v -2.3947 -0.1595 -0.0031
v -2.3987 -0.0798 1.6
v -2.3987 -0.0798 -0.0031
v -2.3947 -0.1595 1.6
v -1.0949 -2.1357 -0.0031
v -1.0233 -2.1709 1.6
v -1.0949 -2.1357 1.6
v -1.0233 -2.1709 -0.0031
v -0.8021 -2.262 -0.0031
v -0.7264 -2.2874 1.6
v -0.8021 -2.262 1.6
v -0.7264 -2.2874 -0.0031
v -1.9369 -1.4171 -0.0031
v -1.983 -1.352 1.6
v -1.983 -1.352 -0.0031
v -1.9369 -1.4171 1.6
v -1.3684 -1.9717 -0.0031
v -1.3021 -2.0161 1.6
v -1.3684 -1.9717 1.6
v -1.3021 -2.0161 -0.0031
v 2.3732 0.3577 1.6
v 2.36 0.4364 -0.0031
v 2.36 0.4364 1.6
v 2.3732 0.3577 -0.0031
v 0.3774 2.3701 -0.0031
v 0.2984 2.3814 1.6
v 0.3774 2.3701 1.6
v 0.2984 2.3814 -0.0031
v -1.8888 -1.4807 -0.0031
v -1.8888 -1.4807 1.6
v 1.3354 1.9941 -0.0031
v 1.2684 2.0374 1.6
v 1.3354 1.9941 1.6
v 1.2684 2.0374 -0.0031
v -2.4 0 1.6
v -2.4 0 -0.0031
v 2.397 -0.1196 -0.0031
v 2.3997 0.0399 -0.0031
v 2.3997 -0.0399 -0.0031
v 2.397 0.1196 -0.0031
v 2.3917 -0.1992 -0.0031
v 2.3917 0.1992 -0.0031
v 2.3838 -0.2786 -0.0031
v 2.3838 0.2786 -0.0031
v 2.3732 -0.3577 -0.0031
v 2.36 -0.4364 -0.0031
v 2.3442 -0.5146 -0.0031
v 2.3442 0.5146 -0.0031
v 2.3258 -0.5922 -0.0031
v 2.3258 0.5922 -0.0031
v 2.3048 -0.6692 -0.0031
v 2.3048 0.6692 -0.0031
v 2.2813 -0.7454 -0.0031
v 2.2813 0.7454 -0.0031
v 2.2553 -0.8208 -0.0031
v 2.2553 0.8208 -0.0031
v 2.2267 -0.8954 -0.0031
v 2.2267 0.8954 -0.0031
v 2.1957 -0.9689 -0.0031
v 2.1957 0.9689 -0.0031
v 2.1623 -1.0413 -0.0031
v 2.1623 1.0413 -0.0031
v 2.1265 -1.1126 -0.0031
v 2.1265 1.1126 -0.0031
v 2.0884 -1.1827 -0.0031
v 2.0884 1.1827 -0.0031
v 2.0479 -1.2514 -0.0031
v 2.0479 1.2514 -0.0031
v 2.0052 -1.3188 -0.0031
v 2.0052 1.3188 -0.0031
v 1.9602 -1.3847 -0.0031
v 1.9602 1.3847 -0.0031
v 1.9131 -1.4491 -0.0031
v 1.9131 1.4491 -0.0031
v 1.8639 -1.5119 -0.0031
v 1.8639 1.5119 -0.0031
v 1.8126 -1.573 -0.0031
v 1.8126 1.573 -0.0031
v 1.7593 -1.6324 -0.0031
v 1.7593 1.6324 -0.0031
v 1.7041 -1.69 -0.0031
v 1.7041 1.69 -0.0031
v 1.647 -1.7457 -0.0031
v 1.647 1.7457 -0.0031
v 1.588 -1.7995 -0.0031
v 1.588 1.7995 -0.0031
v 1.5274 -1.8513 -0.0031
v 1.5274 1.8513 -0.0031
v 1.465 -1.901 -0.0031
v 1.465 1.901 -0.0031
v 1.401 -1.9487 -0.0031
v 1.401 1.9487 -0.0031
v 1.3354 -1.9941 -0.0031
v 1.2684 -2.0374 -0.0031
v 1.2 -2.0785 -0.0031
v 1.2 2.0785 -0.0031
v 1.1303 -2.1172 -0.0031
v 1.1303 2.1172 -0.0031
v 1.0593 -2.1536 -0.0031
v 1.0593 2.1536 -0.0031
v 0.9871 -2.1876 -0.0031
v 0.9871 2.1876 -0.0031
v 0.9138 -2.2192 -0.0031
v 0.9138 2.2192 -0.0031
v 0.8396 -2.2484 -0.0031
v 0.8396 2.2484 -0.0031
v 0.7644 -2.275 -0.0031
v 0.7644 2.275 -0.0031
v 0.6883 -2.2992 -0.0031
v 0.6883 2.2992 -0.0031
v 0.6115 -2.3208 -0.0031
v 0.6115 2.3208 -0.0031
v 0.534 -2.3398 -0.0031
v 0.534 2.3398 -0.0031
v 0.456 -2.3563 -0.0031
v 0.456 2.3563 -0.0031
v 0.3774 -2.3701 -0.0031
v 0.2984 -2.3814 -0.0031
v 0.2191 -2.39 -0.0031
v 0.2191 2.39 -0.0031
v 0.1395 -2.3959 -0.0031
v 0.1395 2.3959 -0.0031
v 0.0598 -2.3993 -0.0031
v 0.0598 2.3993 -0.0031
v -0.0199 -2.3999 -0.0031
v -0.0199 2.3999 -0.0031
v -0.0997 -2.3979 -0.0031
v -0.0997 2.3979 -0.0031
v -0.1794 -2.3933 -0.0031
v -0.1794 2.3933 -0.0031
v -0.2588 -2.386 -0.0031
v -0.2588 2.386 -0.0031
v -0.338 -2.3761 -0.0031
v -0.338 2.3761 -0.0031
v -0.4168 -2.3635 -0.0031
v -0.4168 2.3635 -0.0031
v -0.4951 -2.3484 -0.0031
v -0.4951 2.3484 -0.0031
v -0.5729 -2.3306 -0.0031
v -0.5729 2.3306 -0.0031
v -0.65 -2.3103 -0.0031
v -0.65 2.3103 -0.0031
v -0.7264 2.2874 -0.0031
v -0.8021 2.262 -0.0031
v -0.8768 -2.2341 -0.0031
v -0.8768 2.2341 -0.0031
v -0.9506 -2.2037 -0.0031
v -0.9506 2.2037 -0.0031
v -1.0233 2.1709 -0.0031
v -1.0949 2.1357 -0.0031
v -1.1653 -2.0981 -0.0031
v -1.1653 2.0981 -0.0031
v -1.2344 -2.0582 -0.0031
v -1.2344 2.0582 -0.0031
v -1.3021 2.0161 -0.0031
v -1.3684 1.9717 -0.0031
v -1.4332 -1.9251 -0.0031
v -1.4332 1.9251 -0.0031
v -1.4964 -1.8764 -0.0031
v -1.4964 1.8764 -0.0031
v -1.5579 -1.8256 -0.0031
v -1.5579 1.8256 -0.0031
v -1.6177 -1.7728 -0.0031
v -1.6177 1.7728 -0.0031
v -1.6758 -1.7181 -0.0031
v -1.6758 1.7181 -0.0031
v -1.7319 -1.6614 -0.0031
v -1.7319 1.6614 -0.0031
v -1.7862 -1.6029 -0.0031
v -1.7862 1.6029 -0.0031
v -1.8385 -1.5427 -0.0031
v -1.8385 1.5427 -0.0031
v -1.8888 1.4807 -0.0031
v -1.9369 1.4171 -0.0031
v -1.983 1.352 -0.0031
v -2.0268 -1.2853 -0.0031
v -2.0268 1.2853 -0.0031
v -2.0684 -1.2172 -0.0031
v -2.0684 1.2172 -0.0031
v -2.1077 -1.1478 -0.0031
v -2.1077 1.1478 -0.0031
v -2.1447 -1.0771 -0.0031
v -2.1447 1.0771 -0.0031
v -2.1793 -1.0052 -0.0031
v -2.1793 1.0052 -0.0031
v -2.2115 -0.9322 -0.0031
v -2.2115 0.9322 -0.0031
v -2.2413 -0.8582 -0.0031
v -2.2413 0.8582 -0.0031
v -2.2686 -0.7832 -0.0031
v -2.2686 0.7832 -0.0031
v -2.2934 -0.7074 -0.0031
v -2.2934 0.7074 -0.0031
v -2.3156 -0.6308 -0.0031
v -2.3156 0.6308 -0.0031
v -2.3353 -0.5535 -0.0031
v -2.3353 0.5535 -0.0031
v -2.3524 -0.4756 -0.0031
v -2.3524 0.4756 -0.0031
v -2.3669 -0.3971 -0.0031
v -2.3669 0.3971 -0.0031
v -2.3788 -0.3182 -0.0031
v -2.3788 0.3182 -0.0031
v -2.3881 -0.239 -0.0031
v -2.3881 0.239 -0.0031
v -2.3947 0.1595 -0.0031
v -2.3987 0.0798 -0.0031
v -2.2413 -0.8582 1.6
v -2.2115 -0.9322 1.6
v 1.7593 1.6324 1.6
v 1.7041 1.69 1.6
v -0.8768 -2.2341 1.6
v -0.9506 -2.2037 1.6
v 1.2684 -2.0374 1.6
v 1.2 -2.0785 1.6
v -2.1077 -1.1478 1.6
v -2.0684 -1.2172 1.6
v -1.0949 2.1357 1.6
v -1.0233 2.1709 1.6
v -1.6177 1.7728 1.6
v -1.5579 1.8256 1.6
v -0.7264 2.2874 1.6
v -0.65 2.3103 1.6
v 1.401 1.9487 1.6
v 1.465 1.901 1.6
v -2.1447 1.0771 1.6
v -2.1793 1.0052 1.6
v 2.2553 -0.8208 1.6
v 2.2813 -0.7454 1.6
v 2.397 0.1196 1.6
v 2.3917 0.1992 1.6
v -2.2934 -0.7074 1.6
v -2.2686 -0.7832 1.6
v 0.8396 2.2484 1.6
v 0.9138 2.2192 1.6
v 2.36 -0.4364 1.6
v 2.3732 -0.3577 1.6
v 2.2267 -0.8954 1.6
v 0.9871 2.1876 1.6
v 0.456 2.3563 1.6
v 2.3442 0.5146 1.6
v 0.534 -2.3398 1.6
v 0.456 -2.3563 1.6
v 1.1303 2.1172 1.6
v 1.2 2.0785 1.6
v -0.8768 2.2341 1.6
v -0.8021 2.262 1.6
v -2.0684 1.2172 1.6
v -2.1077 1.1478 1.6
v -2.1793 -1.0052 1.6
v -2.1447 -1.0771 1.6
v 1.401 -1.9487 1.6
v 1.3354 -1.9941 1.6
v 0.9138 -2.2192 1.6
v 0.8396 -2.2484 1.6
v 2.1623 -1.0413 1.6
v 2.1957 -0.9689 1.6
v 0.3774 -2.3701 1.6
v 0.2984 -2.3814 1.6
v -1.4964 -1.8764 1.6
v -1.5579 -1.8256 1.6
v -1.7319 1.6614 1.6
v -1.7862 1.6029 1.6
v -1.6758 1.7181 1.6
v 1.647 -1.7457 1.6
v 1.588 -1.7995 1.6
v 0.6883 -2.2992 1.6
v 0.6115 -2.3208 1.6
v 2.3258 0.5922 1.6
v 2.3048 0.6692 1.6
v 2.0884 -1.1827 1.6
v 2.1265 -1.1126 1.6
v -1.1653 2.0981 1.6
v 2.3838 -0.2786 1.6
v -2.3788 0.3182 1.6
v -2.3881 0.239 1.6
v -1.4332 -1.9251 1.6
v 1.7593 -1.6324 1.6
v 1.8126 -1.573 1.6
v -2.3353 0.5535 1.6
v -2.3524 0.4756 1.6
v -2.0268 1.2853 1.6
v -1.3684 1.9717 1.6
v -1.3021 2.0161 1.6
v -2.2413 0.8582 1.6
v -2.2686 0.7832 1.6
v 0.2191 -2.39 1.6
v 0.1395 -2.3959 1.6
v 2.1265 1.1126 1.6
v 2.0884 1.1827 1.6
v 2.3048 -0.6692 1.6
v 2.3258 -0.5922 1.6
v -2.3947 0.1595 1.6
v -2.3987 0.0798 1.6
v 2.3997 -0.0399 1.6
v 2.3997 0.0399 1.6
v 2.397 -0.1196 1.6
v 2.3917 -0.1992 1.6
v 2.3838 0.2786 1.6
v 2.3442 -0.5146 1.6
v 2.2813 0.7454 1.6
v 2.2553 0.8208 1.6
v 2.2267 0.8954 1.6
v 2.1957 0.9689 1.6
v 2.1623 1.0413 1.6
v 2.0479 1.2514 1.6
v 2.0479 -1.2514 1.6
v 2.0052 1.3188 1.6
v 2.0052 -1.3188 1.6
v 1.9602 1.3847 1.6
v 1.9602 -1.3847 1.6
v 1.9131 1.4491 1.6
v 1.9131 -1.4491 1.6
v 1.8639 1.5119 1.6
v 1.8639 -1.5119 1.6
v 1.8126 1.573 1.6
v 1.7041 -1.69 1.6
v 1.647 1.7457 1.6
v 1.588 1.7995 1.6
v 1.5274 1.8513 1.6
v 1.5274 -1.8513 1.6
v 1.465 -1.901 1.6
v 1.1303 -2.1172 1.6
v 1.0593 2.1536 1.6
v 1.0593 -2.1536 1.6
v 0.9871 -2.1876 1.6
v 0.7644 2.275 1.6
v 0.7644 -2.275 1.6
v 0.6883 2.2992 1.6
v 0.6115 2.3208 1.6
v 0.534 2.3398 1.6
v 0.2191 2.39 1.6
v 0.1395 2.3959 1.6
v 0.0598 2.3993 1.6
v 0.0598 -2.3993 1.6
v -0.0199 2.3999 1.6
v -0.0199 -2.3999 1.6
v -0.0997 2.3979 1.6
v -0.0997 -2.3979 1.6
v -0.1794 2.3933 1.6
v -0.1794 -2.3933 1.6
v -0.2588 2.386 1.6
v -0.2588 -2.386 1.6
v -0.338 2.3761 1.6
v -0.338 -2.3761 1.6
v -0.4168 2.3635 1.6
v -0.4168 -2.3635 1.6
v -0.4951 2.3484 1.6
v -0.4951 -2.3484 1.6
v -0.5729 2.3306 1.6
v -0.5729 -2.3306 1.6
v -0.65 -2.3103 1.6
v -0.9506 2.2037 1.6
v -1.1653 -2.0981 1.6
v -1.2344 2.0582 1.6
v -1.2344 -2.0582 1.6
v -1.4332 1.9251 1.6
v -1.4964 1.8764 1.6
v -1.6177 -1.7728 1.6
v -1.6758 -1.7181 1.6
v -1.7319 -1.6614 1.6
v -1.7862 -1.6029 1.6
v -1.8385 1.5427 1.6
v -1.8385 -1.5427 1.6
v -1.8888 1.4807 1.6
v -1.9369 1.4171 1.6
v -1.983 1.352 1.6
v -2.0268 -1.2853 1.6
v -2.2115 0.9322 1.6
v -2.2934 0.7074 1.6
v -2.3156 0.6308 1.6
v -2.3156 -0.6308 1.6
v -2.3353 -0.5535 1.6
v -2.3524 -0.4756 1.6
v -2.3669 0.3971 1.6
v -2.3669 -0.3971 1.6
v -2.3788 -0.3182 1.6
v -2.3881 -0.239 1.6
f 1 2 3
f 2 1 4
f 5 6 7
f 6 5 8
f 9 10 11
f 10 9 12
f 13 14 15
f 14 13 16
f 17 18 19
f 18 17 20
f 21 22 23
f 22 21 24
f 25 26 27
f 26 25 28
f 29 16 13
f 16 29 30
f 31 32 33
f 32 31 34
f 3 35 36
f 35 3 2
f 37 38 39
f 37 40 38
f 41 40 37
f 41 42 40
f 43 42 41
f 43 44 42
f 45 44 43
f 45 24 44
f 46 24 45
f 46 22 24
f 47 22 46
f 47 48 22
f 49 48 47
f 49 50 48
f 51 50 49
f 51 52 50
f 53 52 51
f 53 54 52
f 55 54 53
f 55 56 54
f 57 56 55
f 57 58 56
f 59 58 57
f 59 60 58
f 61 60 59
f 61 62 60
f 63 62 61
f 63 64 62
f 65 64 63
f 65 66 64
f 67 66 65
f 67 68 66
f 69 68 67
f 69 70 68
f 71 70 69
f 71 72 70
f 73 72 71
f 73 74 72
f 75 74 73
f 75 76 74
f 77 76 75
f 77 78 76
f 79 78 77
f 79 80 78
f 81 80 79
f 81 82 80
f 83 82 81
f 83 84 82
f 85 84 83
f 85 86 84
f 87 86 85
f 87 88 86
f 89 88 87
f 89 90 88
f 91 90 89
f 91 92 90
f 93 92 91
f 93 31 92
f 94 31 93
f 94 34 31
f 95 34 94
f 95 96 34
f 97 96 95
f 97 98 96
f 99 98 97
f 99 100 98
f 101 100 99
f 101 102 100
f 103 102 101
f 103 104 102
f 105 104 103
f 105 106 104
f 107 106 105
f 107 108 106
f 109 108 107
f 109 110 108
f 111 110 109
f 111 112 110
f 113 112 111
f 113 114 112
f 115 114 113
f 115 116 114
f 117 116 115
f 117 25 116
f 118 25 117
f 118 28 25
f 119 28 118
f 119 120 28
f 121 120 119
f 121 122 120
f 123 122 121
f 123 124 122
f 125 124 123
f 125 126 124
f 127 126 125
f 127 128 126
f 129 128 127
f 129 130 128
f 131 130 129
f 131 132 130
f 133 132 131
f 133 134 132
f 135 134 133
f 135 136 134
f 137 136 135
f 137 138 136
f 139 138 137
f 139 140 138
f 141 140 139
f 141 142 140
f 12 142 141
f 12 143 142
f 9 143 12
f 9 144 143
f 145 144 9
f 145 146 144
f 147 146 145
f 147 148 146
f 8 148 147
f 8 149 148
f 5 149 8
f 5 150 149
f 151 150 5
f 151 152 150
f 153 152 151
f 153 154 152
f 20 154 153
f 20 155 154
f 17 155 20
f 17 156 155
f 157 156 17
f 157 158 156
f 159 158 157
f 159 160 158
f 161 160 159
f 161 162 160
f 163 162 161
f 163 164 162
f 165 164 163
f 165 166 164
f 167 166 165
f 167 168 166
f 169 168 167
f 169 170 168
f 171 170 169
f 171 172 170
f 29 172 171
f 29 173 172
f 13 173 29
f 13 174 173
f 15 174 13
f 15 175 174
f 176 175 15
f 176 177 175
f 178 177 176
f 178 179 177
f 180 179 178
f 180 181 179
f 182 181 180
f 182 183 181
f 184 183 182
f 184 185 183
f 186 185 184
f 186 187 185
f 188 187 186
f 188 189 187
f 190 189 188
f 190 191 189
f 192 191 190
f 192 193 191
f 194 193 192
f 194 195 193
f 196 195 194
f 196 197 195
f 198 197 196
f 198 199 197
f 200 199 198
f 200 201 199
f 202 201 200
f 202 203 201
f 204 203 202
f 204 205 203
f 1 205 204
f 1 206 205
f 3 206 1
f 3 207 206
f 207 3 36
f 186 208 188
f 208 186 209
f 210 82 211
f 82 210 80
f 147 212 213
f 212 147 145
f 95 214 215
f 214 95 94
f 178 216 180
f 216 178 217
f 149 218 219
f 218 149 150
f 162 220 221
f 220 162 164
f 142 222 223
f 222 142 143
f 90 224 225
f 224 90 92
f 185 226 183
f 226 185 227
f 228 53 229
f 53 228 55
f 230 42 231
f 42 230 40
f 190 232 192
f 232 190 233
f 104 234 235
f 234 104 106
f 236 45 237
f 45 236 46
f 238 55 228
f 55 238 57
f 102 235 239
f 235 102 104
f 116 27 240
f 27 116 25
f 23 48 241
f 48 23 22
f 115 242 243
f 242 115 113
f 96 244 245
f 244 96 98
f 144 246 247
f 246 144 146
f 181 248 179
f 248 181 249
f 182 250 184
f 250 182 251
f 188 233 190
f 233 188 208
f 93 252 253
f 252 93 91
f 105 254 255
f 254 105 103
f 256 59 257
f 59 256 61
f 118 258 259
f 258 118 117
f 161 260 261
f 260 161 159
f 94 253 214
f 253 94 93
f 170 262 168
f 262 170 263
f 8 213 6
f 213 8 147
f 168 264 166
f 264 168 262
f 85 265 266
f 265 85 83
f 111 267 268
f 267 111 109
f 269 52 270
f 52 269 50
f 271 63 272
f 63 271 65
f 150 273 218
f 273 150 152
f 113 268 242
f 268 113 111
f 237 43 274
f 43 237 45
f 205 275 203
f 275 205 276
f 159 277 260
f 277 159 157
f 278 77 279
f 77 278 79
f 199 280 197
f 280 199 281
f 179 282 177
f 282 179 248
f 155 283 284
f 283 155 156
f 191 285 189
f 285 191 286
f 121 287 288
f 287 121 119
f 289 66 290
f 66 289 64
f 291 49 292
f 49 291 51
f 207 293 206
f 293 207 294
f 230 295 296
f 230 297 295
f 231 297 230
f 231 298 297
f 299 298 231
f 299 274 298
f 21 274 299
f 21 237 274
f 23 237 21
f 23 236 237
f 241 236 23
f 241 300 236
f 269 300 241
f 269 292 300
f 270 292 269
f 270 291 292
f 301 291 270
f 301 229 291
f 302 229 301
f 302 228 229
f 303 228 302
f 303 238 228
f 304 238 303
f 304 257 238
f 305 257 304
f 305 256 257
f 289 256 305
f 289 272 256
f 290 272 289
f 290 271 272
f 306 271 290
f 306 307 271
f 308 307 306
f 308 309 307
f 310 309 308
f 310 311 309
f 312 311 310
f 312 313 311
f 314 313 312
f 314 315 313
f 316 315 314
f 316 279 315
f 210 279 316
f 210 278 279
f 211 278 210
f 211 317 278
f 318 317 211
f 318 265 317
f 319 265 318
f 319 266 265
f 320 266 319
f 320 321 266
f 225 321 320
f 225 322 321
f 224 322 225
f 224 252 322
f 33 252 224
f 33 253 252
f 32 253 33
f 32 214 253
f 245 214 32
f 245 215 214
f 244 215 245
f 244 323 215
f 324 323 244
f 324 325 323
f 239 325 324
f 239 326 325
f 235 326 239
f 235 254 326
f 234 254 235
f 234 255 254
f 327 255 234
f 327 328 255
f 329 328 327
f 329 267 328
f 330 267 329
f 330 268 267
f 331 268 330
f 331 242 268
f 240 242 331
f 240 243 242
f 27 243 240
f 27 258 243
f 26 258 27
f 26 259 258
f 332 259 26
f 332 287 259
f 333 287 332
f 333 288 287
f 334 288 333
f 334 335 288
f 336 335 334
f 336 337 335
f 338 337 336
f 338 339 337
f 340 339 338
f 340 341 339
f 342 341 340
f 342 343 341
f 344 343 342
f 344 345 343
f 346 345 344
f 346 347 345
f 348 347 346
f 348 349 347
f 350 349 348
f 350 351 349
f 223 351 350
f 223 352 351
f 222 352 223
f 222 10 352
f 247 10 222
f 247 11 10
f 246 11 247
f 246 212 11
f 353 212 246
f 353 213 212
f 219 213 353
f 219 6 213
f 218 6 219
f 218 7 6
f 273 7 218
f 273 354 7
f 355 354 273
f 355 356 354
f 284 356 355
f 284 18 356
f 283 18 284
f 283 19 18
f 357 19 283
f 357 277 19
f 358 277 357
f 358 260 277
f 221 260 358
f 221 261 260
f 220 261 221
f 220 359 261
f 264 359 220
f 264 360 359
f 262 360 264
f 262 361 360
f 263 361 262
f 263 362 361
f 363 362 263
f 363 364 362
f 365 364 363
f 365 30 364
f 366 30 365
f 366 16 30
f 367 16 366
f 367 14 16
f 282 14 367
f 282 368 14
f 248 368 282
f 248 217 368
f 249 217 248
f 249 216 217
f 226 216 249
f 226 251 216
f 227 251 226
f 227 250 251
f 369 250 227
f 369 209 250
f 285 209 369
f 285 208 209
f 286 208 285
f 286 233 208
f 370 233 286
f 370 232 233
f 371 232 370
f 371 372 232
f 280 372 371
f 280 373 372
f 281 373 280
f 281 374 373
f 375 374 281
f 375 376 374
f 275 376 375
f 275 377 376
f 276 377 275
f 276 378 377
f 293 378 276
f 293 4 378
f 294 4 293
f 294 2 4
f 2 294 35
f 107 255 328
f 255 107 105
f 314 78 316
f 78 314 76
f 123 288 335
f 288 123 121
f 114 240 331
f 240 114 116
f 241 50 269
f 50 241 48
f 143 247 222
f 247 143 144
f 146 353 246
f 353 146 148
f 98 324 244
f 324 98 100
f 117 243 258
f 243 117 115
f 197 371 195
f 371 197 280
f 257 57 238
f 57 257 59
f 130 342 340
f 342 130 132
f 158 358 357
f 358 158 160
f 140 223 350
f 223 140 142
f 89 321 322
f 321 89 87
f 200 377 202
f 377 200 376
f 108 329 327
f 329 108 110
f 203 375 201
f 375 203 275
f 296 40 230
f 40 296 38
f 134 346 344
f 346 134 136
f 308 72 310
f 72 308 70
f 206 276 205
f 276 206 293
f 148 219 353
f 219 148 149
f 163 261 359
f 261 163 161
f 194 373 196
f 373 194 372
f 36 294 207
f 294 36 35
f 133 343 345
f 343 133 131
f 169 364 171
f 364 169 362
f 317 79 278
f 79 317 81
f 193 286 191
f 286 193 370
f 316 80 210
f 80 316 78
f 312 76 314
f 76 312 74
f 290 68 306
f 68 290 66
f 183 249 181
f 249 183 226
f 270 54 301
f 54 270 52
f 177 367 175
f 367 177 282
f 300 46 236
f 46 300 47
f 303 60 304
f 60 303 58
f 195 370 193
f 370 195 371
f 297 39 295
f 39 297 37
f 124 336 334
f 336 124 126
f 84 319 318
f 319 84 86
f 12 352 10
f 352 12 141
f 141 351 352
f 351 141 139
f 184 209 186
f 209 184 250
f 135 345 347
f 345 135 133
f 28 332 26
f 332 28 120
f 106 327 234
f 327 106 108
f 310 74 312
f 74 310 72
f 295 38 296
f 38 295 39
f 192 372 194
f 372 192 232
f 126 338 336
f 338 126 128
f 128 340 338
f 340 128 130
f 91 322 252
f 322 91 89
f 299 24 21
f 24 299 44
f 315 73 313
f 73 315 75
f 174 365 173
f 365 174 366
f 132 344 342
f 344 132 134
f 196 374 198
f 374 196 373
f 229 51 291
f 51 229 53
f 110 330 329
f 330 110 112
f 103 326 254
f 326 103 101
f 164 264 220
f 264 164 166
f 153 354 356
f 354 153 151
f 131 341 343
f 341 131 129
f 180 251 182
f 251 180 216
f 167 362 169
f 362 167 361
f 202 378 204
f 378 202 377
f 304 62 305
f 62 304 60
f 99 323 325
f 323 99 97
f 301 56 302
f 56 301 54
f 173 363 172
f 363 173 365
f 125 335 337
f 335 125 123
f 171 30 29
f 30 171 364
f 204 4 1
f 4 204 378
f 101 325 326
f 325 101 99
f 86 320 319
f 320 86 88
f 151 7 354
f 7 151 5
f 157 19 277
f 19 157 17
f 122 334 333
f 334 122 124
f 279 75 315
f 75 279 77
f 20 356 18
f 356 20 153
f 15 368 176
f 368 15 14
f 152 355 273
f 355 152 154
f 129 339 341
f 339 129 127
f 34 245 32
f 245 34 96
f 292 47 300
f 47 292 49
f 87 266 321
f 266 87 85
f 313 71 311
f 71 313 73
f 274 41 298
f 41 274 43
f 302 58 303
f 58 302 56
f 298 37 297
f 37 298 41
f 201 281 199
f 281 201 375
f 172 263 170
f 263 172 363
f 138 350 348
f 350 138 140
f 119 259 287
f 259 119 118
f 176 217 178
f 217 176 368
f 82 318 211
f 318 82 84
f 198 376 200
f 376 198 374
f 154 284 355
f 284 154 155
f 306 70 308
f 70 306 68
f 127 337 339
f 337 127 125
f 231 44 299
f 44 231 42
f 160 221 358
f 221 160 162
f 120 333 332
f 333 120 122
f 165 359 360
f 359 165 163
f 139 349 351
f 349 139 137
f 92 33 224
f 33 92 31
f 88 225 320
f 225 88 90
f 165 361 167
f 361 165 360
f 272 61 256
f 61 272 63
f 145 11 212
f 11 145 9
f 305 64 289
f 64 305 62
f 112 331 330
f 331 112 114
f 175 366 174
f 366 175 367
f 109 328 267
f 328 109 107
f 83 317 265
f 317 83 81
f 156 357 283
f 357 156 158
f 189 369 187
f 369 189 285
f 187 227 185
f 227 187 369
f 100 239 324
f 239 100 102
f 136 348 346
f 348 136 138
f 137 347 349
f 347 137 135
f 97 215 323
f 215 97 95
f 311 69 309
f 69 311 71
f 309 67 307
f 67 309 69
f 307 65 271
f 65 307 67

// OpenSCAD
// file: ../p/4-4edge.scad
use <../lib.scad>
$fa=1; $fs=0.2;
function ldraw_lib__4_4edge(realsolid=false) = [
// 0 Circle 1.0
// 0 Name: 4-4edge.dat
// 0 Author: James Jessiman
// 0 !LDRAW_ORG Primitive UPDATE 2017-01
// 0 !LICENSE Licensed under CC BY 2.0 and CC BY 4.0 : see CAreadme.txt
// 
// 0 BFC CERTIFY CCW
  [0,"BFC","CERTIFY"],
  [0,"BFC","CCW"],
// 
// 0 !HISTORY 1998-12-15 [PTadmin] Official Update 1998-10
// 0 !HISTORY 2005-12-28 [PTadmin] Official Update 2005-01
// 0 !HISTORY 2007-06-24 [PTadmin] Header formatted for Contributor Agreement
// 0 !HISTORY 2008-07-01 [PTadmin] Official Update 2008-01
// 0 !HISTORY 2017-01-15 [Steffen] BFCed
// 0 !HISTORY 2017-12-30 [PTadmin] Official Update 2017-01
// 
// 
// 2 24 1 0 0 0.9239 0 0.3827
  [2,24,1,0,0,0.9239,0,0.3827],
// 2 24 0.9239 0 0.3827 0.7071 0 0.7071
  [2,24,0.9239,0,0.3827,0.7071,0,0.7071],
// 2 24 0.7071 0 0.7071 0.3827 0 0.9239
  [2,24,0.7071,0,0.7071,0.3827,0,0.9239],
// 2 24 0.3827 0 0.9239 0 0 1
  [2,24,0.3827,0,0.9239,0,0,1],
// 2 24 0 0 1 -0.3827 0 0.9239
  [2,24,0,0,1,-0.3827,0,0.9239],
// 2 24 -0.3827 0 0.9239 -0.7071 0 0.7071
  [2,24,-0.3827,0,0.9239,-0.7071,0,0.7071],
// 2 24 -0.7071 0 0.7071 -0.9239 0 0.3827
  [2,24,-0.7071,0,0.7071,-0.9239,0,0.3827],
// 2 24 -0.9239 0 0.3827 -1 0 -0
  [2,24,-0.9239,0,0.3827,-1,0,-0],
// 2 24 -1 0 -0 -0.9239 0 -0.3827
  [2,24,-1,0,-0,-0.9239,0,-0.3827],
// 2 24 -0.9239 0 -0.3827 -0.7071 0 -0.7071
  [2,24,-0.9239,0,-0.3827,-0.7071,0,-0.7071],
// 2 24 -0.7071 0 -0.7071 -0.3827 0 -0.9239
  [2,24,-0.7071,0,-0.7071,-0.3827,0,-0.9239],
// 2 24 -0.3827 0 -0.9239 0 0 -1
  [2,24,-0.3827,0,-0.9239,0,0,-1],
// 2 24 0 0 -1 0.3827 0 -0.9239
  [2,24,0,0,-1,0.3827,0,-0.9239],
// 2 24 0.3827 0 -0.9239 0.7071 0 -0.7071
  [2,24,0.3827,0,-0.9239,0.7071,0,-0.7071],
// 2 24 0.7071 0 -0.7071 0.9239 0 -0.3827
  [2,24,0.7071,0,-0.7071,0.9239,0,-0.3827],
// 2 24 0.9239 0 -0.3827 1 0 0
  [2,24,0.9239,0,-0.3827,1,0,0],
];
module ldraw_lib__4_4edge(step=0, col=false, unit=2/5, alt=false, line=0.2, solid=!$preview)
    makepoly(ldraw_lib__4_4edge(solid), step=step, col=col, unit=unit, alt=alt, line=line, solid=solid);
ldraw_lib__4_4edge(line=0.2);
// file: ../p/4-4disc.scad
use <../lib.scad>
$fa=1; $fs=0.2;
function ldraw_lib__4_4disc(realsolid=false) = [
// 0 Disc 1.0
// 0 Name: 4-4disc.dat
// 0 Author: James Jessiman
// 0 !LDRAW_ORG Primitive UPDATE 2002-02
// 0 !LICENSE Licensed under CC BY 2.0 and CC BY 4.0 : see CAreadme.txt
// 
// 0 BFC CERTIFY CCW
  [0,"BFC","CERTIFY"],
  [0,"BFC","CCW"],
// 
// 0 !HISTORY 1998-12-15 [PTadmin] Official Update 1998-10
// 0 !HISTORY 2002-03-23 [sbliss] Added BFC statement
// 0 !HISTORY 2002-04-25 [PTadmin] Official Update 2002-02
// 0 !HISTORY 2007-06-24 [PTadmin] Header formatted for Contributor Agreement
// 0 !HISTORY 2008-07-01 [PTadmin] Official Update 2008-01
// 
// 
// 3 16 0 0 0 1 0 0 0.9239 0 0.3827
  [3,16,0,0,0,1,0,0,0.9239,0,0.3827],
// 3 16 0 0 0 0.9239 0 0.3827 0.7071 0 0.7071
  [3,16,0,0,0,0.9239,0,0.3827,0.7071,0,0.7071],
// 3 16 0 0 0 0.7071 0 0.7071 0.3827 0 0.9239
  [3,16,0,0,0,0.7071,0,0.7071,0.3827,0,0.9239],
// 3 16 0 0 0 0.3827 0 0.9239 0 0 1
  [3,16,0,0,0,0.3827,0,0.9239,0,0,1],
// 3 16 0 0 0 0 0 1 -0.3827 0 0.9239
  [3,16,0,0,0,0,0,1,-0.3827,0,0.9239],
// 3 16 0 0 0 -0.3827 0 0.9239 -0.7071 0 0.7071
  [3,16,0,0,0,-0.3827,0,0.9239,-0.7071,0,0.7071],
// 3 16 0 0 0 -0.7071 0 0.7071 -0.9239 0 0.3827
  [3,16,0,0,0,-0.7071,0,0.7071,-0.9239,0,0.3827],
// 3 16 0 0 0 -0.9239 0 0.3827 -1 0 -0
  [3,16,0,0,0,-0.9239,0,0.3827,-1,0,-0],
// 3 16 0 0 0 -1 0 -0 -0.9239 0 -0.3827
  [3,16,0,0,0,-1,0,-0,-0.9239,0,-0.3827],
// 3 16 0 0 0 -0.9239 0 -0.3827 -0.7071 0 -0.7071
  [3,16,0,0,0,-0.9239,0,-0.3827,-0.7071,0,-0.7071],
// 3 16 0 0 0 -0.7071 0 -0.7071 -0.3827 0 -0.9239
  [3,16,0,0,0,-0.7071,0,-0.7071,-0.3827,0,-0.9239],
// 3 16 0 0 0 -0.3827 0 -0.9239 0 0 -1
  [3,16,0,0,0,-0.3827,0,-0.9239,0,0,-1],
// 3 16 0 0 0 0 0 -1 0.3827 0 -0.9239
  [3,16,0,0,0,0,0,-1,0.3827,0,-0.9239],
// 3 16 0 0 0 0.3827 0 -0.9239 0.7071 0 -0.7071
  [3,16,0,0,0,0.3827,0,-0.9239,0.7071,0,-0.7071],
// 3 16 0 0 0 0.7071 0 -0.7071 0.9239 0 -0.3827
  [3,16,0,0,0,0.7071,0,-0.7071,0.9239,0,-0.3827],
// 3 16 0 0 0 0.9239 0 -0.3827 1 0 0
  [3,16,0,0,0,0.9239,0,-0.3827,1,0,0],
// 0
];
module ldraw_lib__4_4disc(step=0, col=false, unit=2/5, alt=false, line=0.2, solid=!$preview)
    makepoly(ldraw_lib__4_4disc(solid), step=step, col=col, unit=unit, alt=alt, line=line, solid=solid);
ldraw_lib__4_4disc(line=0.2);
// file: ../p/4-4cyli.scad
use <../lib.scad>
$fa=1; $fs=0.2;
function ldraw_lib__4_4cyli(realsolid=false) = [
// 0 Cylinder 1.0
// 0 Name: 4-4cyli.dat
// 0 Author: James Jessiman
// 0 !LDRAW_ORG Primitive UPDATE 2005-01
// 0 !LICENSE Licensed under CC BY 2.0 and CC BY 4.0 : see CAreadme.txt
// 
// 0 BFC CERTIFY CCW
  [0,"BFC","CERTIFY"],
  [0,"BFC","CCW"],
// 
// 0 !HISTORY 1998-12-15 [PTadmin] Official Update 1998-10
// 0 !HISTORY 2002-03-23 [sbliss] Added BFC statement; merged headers from files in distributions LDraw 0.27 and Complete.
// 0 !HISTORY 2002-04-25 [PTadmin] Official Update 2002-02
// 0 !HISTORY 2004-12-14 [guyvivan] BFC CCW
// 0 !HISTORY 2005-12-28 [PTadmin] Official Update 2005-01
// 0 !HISTORY 2007-06-24 [PTadmin] Header formatted for Contributor Agreement
// 0 !HISTORY 2008-07-01 [PTadmin] Official Update 2008-01
// 
// 
// 4 16 1 1 0 0.9239 1 0.3827 0.9239 0 0.3827 1 0 0
  [4,16,1,1,0,0.9239,1,0.3827,0.9239,0,0.3827,1,0,0],
// 5 24 1 0 0 1 1 0 0.9239 0 0.3827 0.9239 0 -0.3827
  [5,24,1,0,0,1,1,0,0.9239,0,0.3827,0.9239,0,-0.3827],
// 4 16 0.9239 1 0.3827 0.7071 1 0.7071 0.7071 0 0.7071 0.9239 0 0.3827
  [4,16,0.9239,1,0.3827,0.7071,1,0.7071,0.7071,0,0.7071,0.9239,0,0.3827],
// 5 24 0.9239 0 0.3827 0.9239 1 0.3827 0.7071 0 0.7071 1 0 0
  [5,24,0.9239,0,0.3827,0.9239,1,0.3827,0.7071,0,0.7071,1,0,0],
// 4 16 0.7071 1 0.7071 0.3827 1 0.9239 0.3827 0 0.9239 0.7071 0 0.7071
  [4,16,0.7071,1,0.7071,0.3827,1,0.9239,0.3827,0,0.9239,0.7071,0,0.7071],
// 5 24 0.7071 0 0.7071 0.7071 1 0.7071 0.3827 0 0.9239 0.9239 0 0.3827
  [5,24,0.7071,0,0.7071,0.7071,1,0.7071,0.3827,0,0.9239,0.9239,0,0.3827],
// 4 16 0.3827 1 0.9239 0 1 1 0 0 1 0.3827 0 0.9239
  [4,16,0.3827,1,0.9239,0,1,1,0,0,1,0.3827,0,0.9239],
// 5 24 0.3827 0 0.9239 0.3827 1 0.9239 0 0 1 0.7071 0 0.7071
  [5,24,0.3827,0,0.9239,0.3827,1,0.9239,0,0,1,0.7071,0,0.7071],
// 4 16 0 1 1 -0.3827 1 0.9239 -0.3827 0 0.9239 0 0 1
  [4,16,0,1,1,-0.3827,1,0.9239,-0.3827,0,0.9239,0,0,1],
// 5 24 0 0 1 0 1 1 -0.3827 0 0.9239 0.3827 0 0.9239
  [5,24,0,0,1,0,1,1,-0.3827,0,0.9239,0.3827,0,0.9239],
// 4 16 -0.3827 1 0.9239 -0.7071 1 0.7071 -0.7071 0 0.7071 -0.3827 0 0.9239
  [4,16,-0.3827,1,0.9239,-0.7071,1,0.7071,-0.7071,0,0.7071,-0.3827,0,0.9239],
// 5 24 -0.3827 0 0.9239 -0.3827 1 0.9239 -0.7071 0 0.7071 0 0 1
  [5,24,-0.3827,0,0.9239,-0.3827,1,0.9239,-0.7071,0,0.7071,0,0,1],
// 4 16 -0.7071 1 0.7071 -0.9239 1 0.3827 -0.9239 0 0.3827 -0.7071 0 0.7071
  [4,16,-0.7071,1,0.7071,-0.9239,1,0.3827,-0.9239,0,0.3827,-0.7071,0,0.7071],
// 5 24 -0.7071 0 0.7071 -0.7071 1 0.7071 -0.9239 0 0.3827 -0.3827 0 0.9239
  [5,24,-0.7071,0,0.7071,-0.7071,1,0.7071,-0.9239,0,0.3827,-0.3827,0,0.9239],
// 4 16 -0.9239 1 0.3827 -1 1 0 -1 0 0 -0.9239 0 0.3827
  [4,16,-0.9239,1,0.3827,-1,1,0,-1,0,0,-0.9239,0,0.3827],
// 5 24 -0.9239 0 0.3827 -0.9239 1 0.3827 -1 0 0 -0.7071 0 0.7071
  [5,24,-0.9239,0,0.3827,-0.9239,1,0.3827,-1,0,0,-0.7071,0,0.7071],
// 4 16 -1 1 0 -0.9239 1 -0.3827 -0.9239 0 -0.3827 -1 0 0
  [4,16,-1,1,0,-0.9239,1,-0.3827,-0.9239,0,-0.3827,-1,0,0],
// 5 24 -1 0 0 -1 1 0 -0.9239 0 -0.3827 -0.9239 0 0.3827
  [5,24,-1,0,0,-1,1,0,-0.9239,0,-0.3827,-0.9239,0,0.3827],
// 4 16 -0.9239 1 -0.3827 -0.7071 1 -0.7071 -0.7071 0 -0.7071 -0.9239 0 -0.3827
  [4,16,-0.9239,1,-0.3827,-0.7071,1,-0.7071,-0.7071,0,-0.7071,-0.9239,0,-0.3827],
// 5 24 -0.9239 0 -0.3827 -0.9239 1 -0.3827 -0.7071 0 -0.7071 -1 0 0
  [5,24,-0.9239,0,-0.3827,-0.9239,1,-0.3827,-0.7071,0,-0.7071,-1,0,0],
// 4 16 -0.7071 1 -0.7071 -0.3827 1 -0.9239 -0.3827 0 -0.9239 -0.7071 0 -0.7071
  [4,16,-0.7071,1,-0.7071,-0.3827,1,-0.9239,-0.3827,0,-0.9239,-0.7071,0,-0.7071],
// 5 24 -0.7071 0 -0.7071 -0.7071 1 -0.7071 -0.3827 0 -0.9239 -0.9239 0 -0.3827
  [5,24,-0.7071,0,-0.7071,-0.7071,1,-0.7071,-0.3827,0,-0.9239,-0.9239,0,-0.3827],
// 4 16 -0.3827 1 -0.9239 0 1 -1 0 0 -1 -0.3827 0 -0.9239
  [4,16,-0.3827,1,-0.9239,0,1,-1,0,0,-1,-0.3827,0,-0.9239],
// 5 24 -0.3827 0 -0.9239 -0.3827 1 -0.9239 0 0 -1 -0.7071 0 -0.7071
  [5,24,-0.3827,0,-0.9239,-0.3827,1,-0.9239,0,0,-1,-0.7071,0,-0.7071],
// 4 16 0 1 -1 0.3827 1 -0.9239 0.3827 0 -0.9239 0 0 -1
  [4,16,0,1,-1,0.3827,1,-0.9239,0.3827,0,-0.9239,0,0,-1],
// 5 24 0 0 -1 0 1 -1 0.3827 0 -0.9239 -0.3827 0 -0.9239
  [5,24,0,0,-1,0,1,-1,0.3827,0,-0.9239,-0.3827,0,-0.9239],
// 4 16 0.3827 1 -0.9239 0.7071 1 -0.7071 0.7071 0 -0.7071 0.3827 0 -0.9239
  [4,16,0.3827,1,-0.9239,0.7071,1,-0.7071,0.7071,0,-0.7071,0.3827,0,-0.9239],
// 5 24 0.3827 0 -0.9239 0.3827 1 -0.9239 0.7071 0 -0.7071 0 0 -1
  [5,24,0.3827,0,-0.9239,0.3827,1,-0.9239,0.7071,0,-0.7071,0,0,-1],
// 4 16 0.7071 1 -0.7071 0.9239 1 -0.3827 0.9239 0 -0.3827 0.7071 0 -0.7071
  [4,16,0.7071,1,-0.7071,0.9239,1,-0.3827,0.9239,0,-0.3827,0.7071,0,-0.7071],
// 5 24 0.7071 0 -0.7071 0.7071 1 -0.7071 0.9239 0 -0.3827 0.3827 0 -0.9239
  [5,24,0.7071,0,-0.7071,0.7071,1,-0.7071,0.9239,0,-0.3827,0.3827,0,-0.9239],
// 4 16 0.9239 1 -0.3827 1 1 0 1 0 0 0.9239 0 -0.3827
  [4,16,0.9239,1,-0.3827,1,1,0,1,0,0,0.9239,0,-0.3827],
// 5 24 0.9239 0 -0.3827 0.9239 1 -0.3827 1 0 0 0.7071 0 -0.7071
  [5,24,0.9239,0,-0.3827,0.9239,1,-0.3827,1,0,0,0.7071,0,-0.7071],
// 0
];
module ldraw_lib__4_4cyli(step=0, col=false, unit=2/5, alt=false, line=0.2, solid=!$preview)
    makepoly(ldraw_lib__4_4cyli(solid), step=step, col=col, unit=unit, alt=alt, line=line, solid=solid);
ldraw_lib__4_4cyli(line=0.2);
// file: ../p/stud3.scad
use <../lib.scad>
use <4-4cyli.scad>
use <4-4disc.scad>
use <4-4edge.scad>
$fa=1; $fs=0.2;
function ldraw_lib__stud3(realsolid=false) = realsolid ? 
    [openscad(translate([0,0,-eps()], o=cylinder(4+eps(), r=4)),2)] : [
// 0 Stud Tube Solid
// 0 Name: stud3.dat
// 0 Author: James Jessiman
// 0 !LDRAW_ORG Primitive UPDATE 2012-01
// 0 !LICENSE Licensed under CC BY 2.0 and CC BY 4.0 : see CAreadme.txt
// 
// 0 BFC CERTIFY CCW
  [0,"BFC","CERTIFY"],
  [0,"BFC","CCW"],
// 
// 0 !HISTORY 2002-04-04 [sbliss] Modified for BFC compliance
// 0 !HISTORY 2002-04-25 [PTadmin] Official Update 2002-02
// 0 !HISTORY 2007-06-24 [PTadmin] Header formatted for Contributor Agreement
// 0 !HISTORY 2008-07-01 [PTadmin] Official Update 2008-01
// 0 !HISTORY 2012-02-16 [Philo] Changed to CCW
// 0 !HISTORY 2012-03-30 [PTadmin] Official Update 2012-01
// 
// 
// 1 16 0 -4 0 4 0 0 0 1 0 0 0 4 4-4edge.dat
  [1,16,0,-4,0,4,0,0,0,1,0,0,0,4, ldraw_lib__4_4edge(realsolid)],
// 1 16 0 0 0 4 0 0 0 1 0 0 0 4 4-4edge.dat
  [1,16,0,0,0,4,0,0,0,1,0,0,0,4, ldraw_lib__4_4edge(realsolid)],
// 1 16 0 -4 0 4 0 0 0 1 0 0 0 4 4-4disc.dat
  [1,16,0,-4,0,4,0,0,0,1,0,0,0,4, ldraw_lib__4_4disc(realsolid)],
// 1 16 0 -4 0 4 0 0 0 4 0 0 0 4 4-4cyli.dat
  [1,16,0,-4,0,4,0,0,0,4,0,0,0,4, ldraw_lib__4_4cyli(realsolid)],
];
module ldraw_lib__stud3(step=0, col=false, unit=2/5, alt=false, line=0.2, solid=!$preview)
    makepoly(ldraw_lib__stud3(solid), step=step, col=col, unit=unit, alt=alt, line=line, solid=solid);
ldraw_lib__stud3(line=0.2);
// file: ../p/stud.scad
use <../lib.scad>
use <4-4cyli.scad>
use <4-4disc.scad>
use <4-4edge.scad>
$fa=1; $fs=0.2;
function ldraw_lib__stud(realsolid=false) = realsolid ? 
    [openscad(translate([0,0,-eps()], o=cylinder(4+eps(), r=6)),2)] : [
// 0 Stud
// 0 Name: stud.dat
// 0 Author: James Jessiman
// 0 !LDRAW_ORG Primitive UPDATE 2012-01
// 0 !LICENSE Licensed under CC BY 2.0 and CC BY 4.0 : see CAreadme.txt
// 
// 0 BFC CERTIFY CCW
  [0,"BFC","CERTIFY"],
  [0,"BFC","CCW"],
// 
// 0 !HISTORY 2002-04-04 [sbliss] Modified for BFC compliance
// 0 !HISTORY 2002-04-25 [PTadmin] Official Update 2002-02
// 0 !HISTORY 2007-06-24 [PTadmin] Header formatted for Contributor Agreement
// 0 !HISTORY 2008-07-01 [PTadmin] Official Update 2008-01
// 0 !HISTORY 2012-02-16 [Philo] Changed to CCW
// 0 !HISTORY 2012-03-30 [PTadmin] Official Update 2012-01
// 
// 
// 1 16 0 0 0 6 0 0 0 1 0 0 0 6 4-4edge.dat
  [1,16,0,0,0,6,0,0,0,1,0,0,0,6, ldraw_lib__4_4edge(realsolid)],
// 1 16 0 -4 0 6 0 0 0 1 0 0 0 6 4-4edge.dat
  [1,16,0,-4,0,6,0,0,0,1,0,0,0,6, ldraw_lib__4_4edge(realsolid)],
// 1 16 0 0 0 6 0 0 0 -4 0 0 0 6 4-4cyli.dat
  [1,16,0,0,0,6,0,0,0,-4,0,0,0,6, ldraw_lib__4_4cyli(realsolid)],
// 1 16 0 -4 0 6 0 0 0 1 0 0 0 6 4-4disc.dat
  [1,16,0,-4,0,6,0,0,0,1,0,0,0,6, ldraw_lib__4_4disc(realsolid)],
];
module ldraw_lib__stud(step=0, col=false, unit=2/5, alt=false, line=0.2, solid=!$preview)
    makepoly(ldraw_lib__stud(solid), step=step, col=col, unit=unit, alt=alt, line=line, solid=solid);
ldraw_lib__stud(line=0.2);
// file: ../p/box5.scad
use <../lib.scad>
$fa=1; $fs=0.2;
function ldraw_lib__box5(realsolid=false) = [
// 0 Box with 5 Faces and All Edges
// 0 Name: box5.dat
// 0 Author: James Jessiman
// 0 !LDRAW_ORG Primitive UPDATE 2012-01
// 0 !LICENSE Licensed under CC BY 2.0 and CC BY 4.0 : see CAreadme.txt
// 
// 0 BFC CERTIFY CCW
  [0,"BFC","CERTIFY"],
  [0,"BFC","CCW"],
// 
// 0 !HISTORY 2002-04-03 [sbliss] Modified for BFC compliance
// 0 !HISTORY 2002-04-25 [PTadmin] Official Update 2002-02
// 0 !HISTORY 2007-06-24 [PTadmin] Header formatted for Contributor Agreement
// 0 !HISTORY 2008-07-01 [PTadmin] Official Update 2008-01
// 0 !HISTORY 2012-02-16 [Philo] Changed to CCW
// 0 !HISTORY 2012-03-30 [PTadmin] Official Update 2012-01
// 
// 
// 2 24 1 1 1 -1 1 1
  [2,24,1,1,1,-1,1,1],
// 2 24 -1 1 1 -1 1 -1
  [2,24,-1,1,1,-1,1,-1],
// 2 24 -1 1 -1 1 1 -1
  [2,24,-1,1,-1,1,1,-1],
// 2 24 1 1 -1 1 1 1
  [2,24,1,1,-1,1,1,1],
// 2 24 1 0 1 -1 0 1
  [2,24,1,0,1,-1,0,1],
// 2 24 -1 0 1 -1 0 -1
  [2,24,-1,0,1,-1,0,-1],
// 2 24 -1 0 -1 1 0 -1
  [2,24,-1,0,-1,1,0,-1],
// 2 24 1 0 -1 1 0 1
  [2,24,1,0,-1,1,0,1],
// 2 24 1 0 1 1 1 1
  [2,24,1,0,1,1,1,1],
// 2 24 -1 0 1 -1 1 1
  [2,24,-1,0,1,-1,1,1],
// 2 24 1 0 -1 1 1 -1
  [2,24,1,0,-1,1,1,-1],
// 2 24 -1 0 -1 -1 1 -1
  [2,24,-1,0,-1,-1,1,-1],
// 4 16 -1 1 1 1 1 1 1 1 -1 -1 1 -1
  [4,16,-1,1,1,1,1,1,1,1,-1,-1,1,-1],
// 4 16 -1 1 1 -1 0 1 1 0 1 1 1 1
  [4,16,-1,1,1,-1,0,1,1,0,1,1,1,1],
// 4 16 -1 1 -1 -1 0 -1 -1 0 1 -1 1 1
  [4,16,-1,1,-1,-1,0,-1,-1,0,1,-1,1,1],
// 4 16 1 1 -1 1 0 -1 -1 0 -1 -1 1 -1
  [4,16,1,1,-1,1,0,-1,-1,0,-1,-1,1,-1],
// 4 16 1 1 1 1 0 1 1 0 -1 1 1 -1
  [4,16,1,1,1,1,0,1,1,0,-1,1,1,-1],
];
module ldraw_lib__box5(step=0, col=false, unit=2/5, alt=false, line=0.2, solid=!$preview)
    makepoly(ldraw_lib__box5(solid), step=step, col=col, unit=unit, alt=alt, line=line, solid=solid);
ldraw_lib__box5(line=0.2);
// file: ../p/box4t.scad
use <../lib.scad>
$fa=1; $fs=0.2;
function ldraw_lib__box4t(realsolid=false) = [
// 0 Box with 4 Adjacent Faces and All Edges
// 0 Name: box4t.dat
// 0 Author: Tore Eriksson [Tore_Eriksson]
// 0 !LDRAW_ORG Primitive UPDATE 2003-02
// 0 !LICENSE Licensed under CC BY 2.0 and CC BY 4.0 : see CAreadme.txt
// 
// 0 BFC CERTIFY CCW
  [0,"BFC","CERTIFY"],
  [0,"BFC","CCW"],
// 
// 0 !HISTORY 1997-09-29 [PTadmin] Official Update 1997-15
// 0 !HISTORY 2002-08-31 [izanette] Modified with WINDZ for BFC compliance
// 0 !HISTORY 2003-08-01 [PTadmin] Official Update 2003-02
// 0 !HISTORY 2007-06-24 [PTadmin] Header formatted for Contributor Agreement
// 0 !HISTORY 2008-07-01 [PTadmin] Official Update 2008-01
// 
// 
// 2 24 1 1 1 -1 1 1
  [2,24,1,1,1,-1,1,1],
// 2 24 -1 1 1 -1 1 -1
  [2,24,-1,1,1,-1,1,-1],
// 2 24 -1 1 -1 1 1 -1
  [2,24,-1,1,-1,1,1,-1],
// 2 24 1 1 -1 1 1 1
  [2,24,1,1,-1,1,1,1],
// 2 24 1 0 1 -1 0 1
  [2,24,1,0,1,-1,0,1],
// 2 24 -1 0 1 -1 0 -1
  [2,24,-1,0,1,-1,0,-1],
// 2 24 -1 0 -1 1 0 -1
  [2,24,-1,0,-1,1,0,-1],
// 2 24 1 0 -1 1 0 1
  [2,24,1,0,-1,1,0,1],
// 2 24 1 0 1 1 1 1
  [2,24,1,0,1,1,1,1],
// 2 24 -1 0 1 -1 1 1
  [2,24,-1,0,1,-1,1,1],
// 2 24 1 0 -1 1 1 -1
  [2,24,1,0,-1,1,1,-1],
// 2 24 -1 0 -1 -1 1 -1
  [2,24,-1,0,-1,-1,1,-1],
// 4 16 1 1 1 1 1 -1 -1 1 -1 -1 1 1
  [4,16,1,1,1,1,1,-1,-1,1,-1,-1,1,1],
// 4 16 1 1 1 -1 1 1 -1 0 1 1 0 1
  [4,16,1,1,1,-1,1,1,-1,0,1,1,0,1],
// 4 16 -1 1 1 -1 1 -1 -1 0 -1 -1 0 1
  [4,16,-1,1,1,-1,1,-1,-1,0,-1,-1,0,1],
// 0 4 16 -1 1 -1 -1 0 -1 1 0 -1 1 1 -1
// 4 16 1 1 -1 1 1 1 1 0 1 1 0 -1
  [4,16,1,1,-1,1,1,1,1,0,1,1,0,-1],
// 0
];
module ldraw_lib__box4t(step=0, col=false, unit=2/5, alt=false, line=0.2, solid=!$preview)
    makepoly(ldraw_lib__box4t(solid), step=step, col=col, unit=unit, alt=alt, line=line, solid=solid);
ldraw_lib__box4t(line=0.2);
// file: s/3004s01.scad
use <../../lib.scad>
use <../../p/box4t.scad>
use <../../p/box5.scad>
use <../../p/stud.scad>
use <../../p/stud3.scad>
$fa=1; $fs=0.2;
function ldraw_lib__s__3004s01(realsolid=false) = [
// 0 ~Brick  1 x  2 without Front Face
// 0 Name: s\3004s01.dat
// 0 Author: James Jessiman
// 0 !LDRAW_ORG Subpart UPDATE 2003-03
// 0 !LICENSE Licensed under CC BY 2.0 and CC BY 4.0 : see CAreadme.txt
// 
// 0 BFC CERTIFY CCW
  [0,"BFC","CERTIFY"],
  [0,"BFC","CCW"],
// 
// 0 !HISTORY 2003-09-07 [jriley] Subfiling, BFC
// 0 !HISTORY 2003-12-19 [PTadmin] Official Update 2003-03
// 0 !HISTORY 2007-08-29 [PTadmin] Header formatted for Contributor Agreement
// 0 !HISTORY 2008-07-01 [PTadmin] Official Update 2008-01
// 
// 
// 1 16 0 4 0 1 0 0 0 -5 0 0 0 1 stud3.dat
  [1,16,0,4,0,1,0,0,0,-5,0,0,0,1, ldraw_lib__stud3(realsolid)],
// 0 BFC INVERTNEXT
  [0,"BFC","INVERTNEXT"],
// 1 16 0 24 0 16 0 0 0 -20 0 0 0 6 box5.dat
  [1,16,0,24,0,16,0,0,0,-20,0,0,0,6, ldraw_lib__box5(realsolid)],
// 4 16 20 24 10 16 24 6 -16 24 6 -20 24 10
  [4,16,20,24,10,16,24,6,-16,24,6,-20,24,10],
// 4 16 -20 24 10 -16 24 6 -16 24 -6 -20 24 -10
  [4,16,-20,24,10,-16,24,6,-16,24,-6,-20,24,-10],
// 4 16 -20 24 -10 -16 24 -6 16 24 -6 20 24 -10
  [4,16,-20,24,-10,-16,24,-6,16,24,-6,20,24,-10],
// 4 16 20 24 -10 16 24 -6 16 24 6 20 24 10
  [4,16,20,24,-10,16,24,-6,16,24,6,20,24,10],
// 1 16 0 24 0 20 0 0 0 -24 0 0 0 10 box4t.dat
  [1,16,0,24,0,20,0,0,0,-24,0,0,0,10, ldraw_lib__box4t(realsolid)],
// 1 16 10 0 0 1 0 0 0 1 0 0 0 1 stud.dat
  [1,16,10,0,0,1,0,0,0,1,0,0,0,1, ldraw_lib__stud(realsolid)],
// 1 16 -10 0 0 1 0 0 0 1 0 0 0 1 stud.dat
  [1,16,-10,0,0,1,0,0,0,1,0,0,0,1, ldraw_lib__stud(realsolid)],
// 0
];
module ldraw_lib__s__3004s01(step=0, col=false, unit=2/5, alt=false, line=0.2, solid=!$preview)
    makepoly(ldraw_lib__s__3004s01(solid), step=step, col=col, unit=unit, alt=alt, line=line, solid=solid);
ldraw_lib__s__3004s01(line=0.2);
// file: s/3005s01.scad
use <../../lib.scad>
use <../../p/box4t.scad>
use <../../p/box5.scad>
use <../../p/stud.scad>
$fa=1; $fs=0.2;
function ldraw_lib__s__3005s01(realsolid=false) = [
// 0 ~Brick  1 x  1 without Front Face
// 0 Name: s\3005s01.dat
// 0 Author: John Riley [jriley]
// 0 !LDRAW_ORG Subpart UPDATE 2004-01
// 0 !LICENSE Licensed under CC BY 2.0 and CC BY 4.0 : see CAreadme.txt
// 
// 0 BFC CERTIFY CCW
  [0,"BFC","CERTIFY"],
  [0,"BFC","CCW"],
// 
// 0 !HISTORY 2003-09-07 [jriley] BFCed & Subfiled
// 0 !HISTORY 2004-03-02 [PTadmin] Official Update 2004-01
// 0 !HISTORY 2007-08-29 [PTadmin] Header formatted for Contributor Agreement
// 0 !HISTORY 2008-07-01 [PTadmin] Official Update 2008-01
// 
// 
// 0 BFC INVERTNEXT
  [0,"BFC","INVERTNEXT"],
// 1 16 0 24 0 0 0 6 0 -20 0 -6 0 0 box5.dat
  [1,16,0,24,0,0,0,6,0,-20,0,-6,0,0, ldraw_lib__box5(realsolid)],
// 4 16 10 24 -10 6 24 -6 6 24 6 10 24 10
  [4,16,10,24,-10,6,24,-6,6,24,6,10,24,10],
// 4 16 10 24 10 6 24 6 -6 24 6 -10 24 10
  [4,16,10,24,10,6,24,6,-6,24,6,-10,24,10],
// 4 16 -10 24 10 -6 24 6 -6 24 -6 -10 24 -10
  [4,16,-10,24,10,-6,24,6,-6,24,-6,-10,24,-10],
// 4 16 -10 24 -10 -6 24 -6 6 24 -6 10 24 -10
  [4,16,-10,24,-10,-6,24,-6,6,24,-6,10,24,-10],
// 1 16 0 24 0 10 0 0 0 -24 0 0 0 10 box4t.dat
  [1,16,0,24,0,10,0,0,0,-24,0,0,0,10, ldraw_lib__box4t(realsolid)],
// 1 16 0 0 0 0 0 1 0 1 0 -1 0 0 stud.dat
  [1,16,0,0,0,0,0,1,0,1,0,-1,0,0, ldraw_lib__stud(realsolid)],
// 0
];
module ldraw_lib__s__3005s01(step=0, col=false, unit=2/5, alt=false, line=0.2, solid=!$preview)
    makepoly(ldraw_lib__s__3005s01(solid), step=step, col=col, unit=unit, alt=alt, line=line, solid=solid);
ldraw_lib__s__3005s01(line=0.2);
// file: ../p/box5-12.scad
use <../lib.scad>
$fa=1; $fs=0.2;
function ldraw_lib__box5_12(realsolid=false) = [
// 0 Box with 5 Faces without Any Edges
// 0 Name: box5-12.dat
// 0 Author: Chris Dee [cwdee]
// 0 !LDRAW_ORG Primitive UPDATE 2009-02
// 0 !LICENSE Licensed under CC BY 2.0 and CC BY 4.0 : see CAreadme.txt
// 
// 0 BFC CERTIFY CCW
  [0,"BFC","CERTIFY"],
  [0,"BFC","CCW"],
// 
// 0 !HISTORY 2009-09-03 [PTadmin] Official Update 2009-02
// 
// 
// 4 16 1 1 1 1 1 -1 -1 1 -1 -1 1 1
  [4,16,1,1,1,1,1,-1,-1,1,-1,-1,1,1],
// 4 16 -1 0 1 1 0 1 1 1 1 -1 1 1
  [4,16,-1,0,1,1,0,1,1,1,1,-1,1,1],
// 4 16 -1 0 -1 -1 0 1 -1 1 1 -1 1 -1
  [4,16,-1,0,-1,-1,0,1,-1,1,1,-1,1,-1],
// 4 16 1 0 -1 -1 0 -1 -1 1 -1 1 1 -1
  [4,16,1,0,-1,-1,0,-1,-1,1,-1,1,1,-1],
// 4 16 1 0 1 1 0 -1 1 1 -1 1 1 1
  [4,16,1,0,1,1,0,-1,1,1,-1,1,1,1],
// 0
];
module ldraw_lib__box5_12(step=0, col=false, unit=2/5, alt=false, line=0.2, solid=!$preview)
    makepoly(ldraw_lib__box5_12(solid), step=step, col=col, unit=unit, alt=alt, line=line, solid=solid);
ldraw_lib__box5_12(line=0.2);
// file: 3004.scad
use <../lib.scad>
use <s/3004s01.scad>
$fa=1; $fs=0.2;
function ldraw_lib__3004(realsolid=false) = [
// 0 Brick  1 x  2
// 0 Name: 3004.dat
// 0 Author: James Jessiman
// 0 !LDRAW_ORG Part UPDATE 2022-05
// 0 !LICENSE Licensed under CC BY 2.0 and CC BY 4.0 : see CAreadme.txt
// 
// 0 BFC CERTIFY CCW
  [0,"BFC","CERTIFY"],
  [0,"BFC","CCW"],
// 
// 0 !HISTORY 2001-10-26 [PTadmin] Official Update 2001-01
// 0 !HISTORY 2002-05-07 {unknown} BFC Certification
// 0 !HISTORY 2002-06-11 [PTadmin] Official Update 2002-03
// 0 !HISTORY 2007-05-07 [PTadmin] Header formatted for Contributor Agreement
// 0 !HISTORY 2008-07-01 [PTadmin] Official Update 2008-01
// 0 !HISTORY 2022-08-04 [MagFors] Using subfile
// 0 !HISTORY 2022-09-15 [PTadmin] Official Update 2022-05
// 
// 
// 1 16 0 0 0 1 0 0 0 1 0 0 0 1 s\3004s01.dat
  [1,16,0,0,0,1,0,0,0,1,0,0,0,1, ldraw_lib__s__3004s01(realsolid)],
// 4 16 -20 24 -10 20 24 -10 20 0 -10 -20 0 -10
  [4,16,-20,24,-10,20,24,-10,20,0,-10,-20,0,-10],
];
module ldraw_lib__3004(step=0, col=false, unit=2/5, alt=false, line=0.2, solid=!$preview)
    makepoly(ldraw_lib__3004(solid), step=step, col=col, unit=unit, alt=alt, line=line, solid=solid);
ldraw_lib__3004(line=0.2);
// file: 3005.scad
use <../lib.scad>
use <s/3005s01.scad>
$fa=1; $fs=0.2;
function ldraw_lib__3005(realsolid=false) = [
// 0 Brick  1 x  1
// 0 Name: 3005.dat
// 0 Author: James Jessiman
// 0 !LDRAW_ORG Part UPDATE 2022-05
// 0 !LICENSE Licensed under CC BY 2.0 and CC BY 4.0 : see CAreadme.txt
// 
// 0 BFC CERTIFY CCW
  [0,"BFC","CERTIFY"],
  [0,"BFC","CCW"],
// 
// 0 !HISTORY 2001-10-26 [PTadmin] Official Update 2001-01
// 0 !HISTORY 2002-05-07 {unknown} BFC Certification
// 0 !HISTORY 2002-06-11 [PTadmin] Official Update 2002-03
// 0 !HISTORY 2007-05-07 [PTadmin] Header formatted for Contributor Agreement
// 0 !HISTORY 2008-07-01 [PTadmin] Official Update 2008-01
// 0 !HISTORY 2022-08-04 [MagFors] Using subfile
// 0 !HISTORY 2022-09-15 [PTadmin] Official Update 2022-05
// 
// 
// 1 16 0 0 0 1 0 0 0 1 0 0 0 1 s\3005s01.dat
  [1,16,0,0,0,1,0,0,0,1,0,0,0,1, ldraw_lib__s__3005s01(realsolid)],
// 4 16 -10 24 -10 10 24 -10 10 0 -10 -10 0 -10
  [4,16,-10,24,-10,10,24,-10,10,0,-10,-10,0,-10],
];
module ldraw_lib__3005(step=0, col=false, unit=2/5, alt=false, line=0.2, solid=!$preview)
    makepoly(ldraw_lib__3005(solid), step=step, col=col, unit=unit, alt=alt, line=line, solid=solid);
ldraw_lib__3005(line=0.2);
// file: 191915g.scad
use <../lib.scad>
use <../p/box5-12.scad>
$fa=1; $fs=0.2;
function ldraw_lib__191915g(realsolid=false) = [
// 0 Sticker  1.2 x  1 with Green "1"
// 0 Name: 191915g.dat
// 0 Author: Steffen [Steffen]
// 0 !LDRAW_ORG Part UPDATE 2012-01
// 0 !LICENSE Licensed under CC BY 2.0 and CC BY 4.0 : see CAreadme.txt
// 
// 0 BFC CERTIFY CCW
  [0,"BFC","CERTIFY"],
  [0,"BFC","CCW"],
// 
// 0 !KEYWORDS set 7740
// 
// 0 !HISTORY 2012-03-30 [PTadmin] Official Update 2012-01
// 
// 
// 1 16 0 -0.25 0 10 0 0 0 0.25 0 0 0 -12 box5-12.dat
  [1,16,0,-0.25,0,10,0,0,0,0.25,0,0,0,-12, ldraw_lib__box5_12(realsolid)],
// 3 2 -5.453 -0.25 6.359 -5.453 -0.25 3.734 -5.167 -0.25 6.359
  [3,2,-5.453,-0.25,6.359,-5.453,-0.25,3.734,-5.167,-0.25,6.359],
// 3 2 -1 -0.25 3.734 -1.618 -0.25 7.115 -5.167 -0.25 6.359
  [3,2,-1,-0.25,3.734,-1.618,-0.25,7.115,-5.167,-0.25,6.359],
// 3 2 -5.167 -0.25 6.359 -5.453 -0.25 3.734 -1 -0.25 3.734
  [3,2,-5.167,-0.25,6.359,-5.453,-0.25,3.734,-1,-0.25,3.734],
// 3 2 -1 -0.25 -9 2.672 -0.25 -9 -1 -0.25 3.734
  [3,2,-1,-0.25,-9,2.672,-0.25,-9,-1,-0.25,3.734],
// 3 2 2.672 -0.25 9.641 -0.31 -0.25 9.641 -1.618 -0.25 7.115
  [3,2,2.672,-0.25,9.641,-0.31,-0.25,9.641,-1.618,-0.25,7.115],
// 3 2 2.672 -0.25 9.641 -1 -0.25 3.734 2.672 -0.25 -9
  [3,2,2.672,-0.25,9.641,-1,-0.25,3.734,2.672,-0.25,-9],
// 3 2 2.672 -0.25 9.641 -1.618 -0.25 7.115 -1 -0.25 3.734
  [3,2,2.672,-0.25,9.641,-1.618,-0.25,7.115,-1,-0.25,3.734],
// 3 16 -10 -0.25 12 -10 -0.25 -12 -5.453 -0.25 3.734
  [3,16,-10,-0.25,12,-10,-0.25,-12,-5.453,-0.25,3.734],
// 3 16 -10 -0.25 12 -5.453 -0.25 3.734 -5.453 -0.25 6.359
  [3,16,-10,-0.25,12,-5.453,-0.25,3.734,-5.453,-0.25,6.359],
// 3 16 -5.167 -0.25 6.359 -0.31 -0.25 9.641 -5.453 -0.25 6.359
  [3,16,-5.167,-0.25,6.359,-0.31,-0.25,9.641,-5.453,-0.25,6.359],
// 3 16 -5.453 -0.25 6.359 -0.31 -0.25 9.641 -10 -0.25 12
  [3,16,-5.453,-0.25,6.359,-0.31,-0.25,9.641,-10,-0.25,12],
// 3 16 -0.31 -0.25 9.641 -5.167 -0.25 6.359 -1.618 -0.25 7.115
  [3,16,-0.31,-0.25,9.641,-5.167,-0.25,6.359,-1.618,-0.25,7.115],
// 3 16 -5.453 -0.25 3.734 -10 -0.25 -12 -1 -0.25 -9
  [3,16,-5.453,-0.25,3.734,-10,-0.25,-12,-1,-0.25,-9],
// 3 16 -1 -0.25 -9 10 -0.25 -12 2.672 -0.25 -9
  [3,16,-1,-0.25,-9,10,-0.25,-12,2.672,-0.25,-9],
// 3 16 10 -0.25 -12 -1 -0.25 -9 -10 -0.25 -12
  [3,16,10,-0.25,-12,-1,-0.25,-9,-10,-0.25,-12],
// 3 16 2.672 -0.25 -9 10 -0.25 -12 10 -0.25 12
  [3,16,2.672,-0.25,-9,10,-0.25,-12,10,-0.25,12],
// 3 16 2.672 -0.25 9.641 10 -0.25 12 -0.31 -0.25 9.641
  [3,16,2.672,-0.25,9.641,10,-0.25,12,-0.31,-0.25,9.641],
// 3 16 2.672 -0.25 -9 10 -0.25 12 2.672 -0.25 9.641
  [3,16,2.672,-0.25,-9,10,-0.25,12,2.672,-0.25,9.641],
// 3 16 -0.31 -0.25 9.641 10 -0.25 12 -10 -0.25 12
  [3,16,-0.31,-0.25,9.641,10,-0.25,12,-10,-0.25,12],
// 3 16 -1 -0.25 -9 -1 -0.25 3.734 -5.453 -0.25 3.734
  [3,16,-1,-0.25,-9,-1,-0.25,3.734,-5.453,-0.25,3.734],
];
module ldraw_lib__191915g(step=0, col=false, unit=2/5, alt=false, line=0.2, solid=!$preview)
    makepoly(ldraw_lib__191915g(solid), step=step, col=col, unit=unit, alt=alt, line=line, solid=solid);
ldraw_lib__191915g(line=0.2);
// main file
use <../lib.scad>
use <191915g.scad>
use <3005.scad>
$fa=1; $fs=0.2;
function ldraw_lib__3005d01(realsolid=false) = [
// 0 Brick  1 x  1 with Green "1" Sticker
// 0 Name: 3005d01.dat
// 0 Author: Steffen [Steffen]
// 0 !LDRAW_ORG Shortcut UPDATE 2018-02
// 0 !LICENSE Licensed under CC BY 2.0 and CC BY 4.0 : see CAreadme.txt
// 
// 0 BFC CERTIFY CCW
  [0,"BFC","CERTIFY"],
  [0,"BFC","CCW"],
// 
// 0 !KEYWORDS set 7740
// 
// 0 !HISTORY 2018-12-08 [PTadmin] Official Update 2018-02
// 
// 
// 1 16 0 0 0 1 0 0 0 1 0 0 0 1 3005.dat
  [1,16,0,0,0,1,0,0,0,1,0,0,0,1, ldraw_lib__3005(realsolid)],
// 1 16 0 12 -10 1 0 0 0 0 -1 0 1 0 191915g.dat
  [1,16,0,12,-10,1,0,0,0,0,-1,0,1,0, ldraw_lib__191915g(realsolid)],
];
module ldraw_lib__3005d01(step=0, col=false, unit=2/5, alt=false, line=0.2, solid=!$preview)
    makepoly(ldraw_lib__3005d01(solid), step=step, col=col, unit=unit, alt=alt, line=line, solid=solid);
ldraw_lib__3005d01(line=0.2);
